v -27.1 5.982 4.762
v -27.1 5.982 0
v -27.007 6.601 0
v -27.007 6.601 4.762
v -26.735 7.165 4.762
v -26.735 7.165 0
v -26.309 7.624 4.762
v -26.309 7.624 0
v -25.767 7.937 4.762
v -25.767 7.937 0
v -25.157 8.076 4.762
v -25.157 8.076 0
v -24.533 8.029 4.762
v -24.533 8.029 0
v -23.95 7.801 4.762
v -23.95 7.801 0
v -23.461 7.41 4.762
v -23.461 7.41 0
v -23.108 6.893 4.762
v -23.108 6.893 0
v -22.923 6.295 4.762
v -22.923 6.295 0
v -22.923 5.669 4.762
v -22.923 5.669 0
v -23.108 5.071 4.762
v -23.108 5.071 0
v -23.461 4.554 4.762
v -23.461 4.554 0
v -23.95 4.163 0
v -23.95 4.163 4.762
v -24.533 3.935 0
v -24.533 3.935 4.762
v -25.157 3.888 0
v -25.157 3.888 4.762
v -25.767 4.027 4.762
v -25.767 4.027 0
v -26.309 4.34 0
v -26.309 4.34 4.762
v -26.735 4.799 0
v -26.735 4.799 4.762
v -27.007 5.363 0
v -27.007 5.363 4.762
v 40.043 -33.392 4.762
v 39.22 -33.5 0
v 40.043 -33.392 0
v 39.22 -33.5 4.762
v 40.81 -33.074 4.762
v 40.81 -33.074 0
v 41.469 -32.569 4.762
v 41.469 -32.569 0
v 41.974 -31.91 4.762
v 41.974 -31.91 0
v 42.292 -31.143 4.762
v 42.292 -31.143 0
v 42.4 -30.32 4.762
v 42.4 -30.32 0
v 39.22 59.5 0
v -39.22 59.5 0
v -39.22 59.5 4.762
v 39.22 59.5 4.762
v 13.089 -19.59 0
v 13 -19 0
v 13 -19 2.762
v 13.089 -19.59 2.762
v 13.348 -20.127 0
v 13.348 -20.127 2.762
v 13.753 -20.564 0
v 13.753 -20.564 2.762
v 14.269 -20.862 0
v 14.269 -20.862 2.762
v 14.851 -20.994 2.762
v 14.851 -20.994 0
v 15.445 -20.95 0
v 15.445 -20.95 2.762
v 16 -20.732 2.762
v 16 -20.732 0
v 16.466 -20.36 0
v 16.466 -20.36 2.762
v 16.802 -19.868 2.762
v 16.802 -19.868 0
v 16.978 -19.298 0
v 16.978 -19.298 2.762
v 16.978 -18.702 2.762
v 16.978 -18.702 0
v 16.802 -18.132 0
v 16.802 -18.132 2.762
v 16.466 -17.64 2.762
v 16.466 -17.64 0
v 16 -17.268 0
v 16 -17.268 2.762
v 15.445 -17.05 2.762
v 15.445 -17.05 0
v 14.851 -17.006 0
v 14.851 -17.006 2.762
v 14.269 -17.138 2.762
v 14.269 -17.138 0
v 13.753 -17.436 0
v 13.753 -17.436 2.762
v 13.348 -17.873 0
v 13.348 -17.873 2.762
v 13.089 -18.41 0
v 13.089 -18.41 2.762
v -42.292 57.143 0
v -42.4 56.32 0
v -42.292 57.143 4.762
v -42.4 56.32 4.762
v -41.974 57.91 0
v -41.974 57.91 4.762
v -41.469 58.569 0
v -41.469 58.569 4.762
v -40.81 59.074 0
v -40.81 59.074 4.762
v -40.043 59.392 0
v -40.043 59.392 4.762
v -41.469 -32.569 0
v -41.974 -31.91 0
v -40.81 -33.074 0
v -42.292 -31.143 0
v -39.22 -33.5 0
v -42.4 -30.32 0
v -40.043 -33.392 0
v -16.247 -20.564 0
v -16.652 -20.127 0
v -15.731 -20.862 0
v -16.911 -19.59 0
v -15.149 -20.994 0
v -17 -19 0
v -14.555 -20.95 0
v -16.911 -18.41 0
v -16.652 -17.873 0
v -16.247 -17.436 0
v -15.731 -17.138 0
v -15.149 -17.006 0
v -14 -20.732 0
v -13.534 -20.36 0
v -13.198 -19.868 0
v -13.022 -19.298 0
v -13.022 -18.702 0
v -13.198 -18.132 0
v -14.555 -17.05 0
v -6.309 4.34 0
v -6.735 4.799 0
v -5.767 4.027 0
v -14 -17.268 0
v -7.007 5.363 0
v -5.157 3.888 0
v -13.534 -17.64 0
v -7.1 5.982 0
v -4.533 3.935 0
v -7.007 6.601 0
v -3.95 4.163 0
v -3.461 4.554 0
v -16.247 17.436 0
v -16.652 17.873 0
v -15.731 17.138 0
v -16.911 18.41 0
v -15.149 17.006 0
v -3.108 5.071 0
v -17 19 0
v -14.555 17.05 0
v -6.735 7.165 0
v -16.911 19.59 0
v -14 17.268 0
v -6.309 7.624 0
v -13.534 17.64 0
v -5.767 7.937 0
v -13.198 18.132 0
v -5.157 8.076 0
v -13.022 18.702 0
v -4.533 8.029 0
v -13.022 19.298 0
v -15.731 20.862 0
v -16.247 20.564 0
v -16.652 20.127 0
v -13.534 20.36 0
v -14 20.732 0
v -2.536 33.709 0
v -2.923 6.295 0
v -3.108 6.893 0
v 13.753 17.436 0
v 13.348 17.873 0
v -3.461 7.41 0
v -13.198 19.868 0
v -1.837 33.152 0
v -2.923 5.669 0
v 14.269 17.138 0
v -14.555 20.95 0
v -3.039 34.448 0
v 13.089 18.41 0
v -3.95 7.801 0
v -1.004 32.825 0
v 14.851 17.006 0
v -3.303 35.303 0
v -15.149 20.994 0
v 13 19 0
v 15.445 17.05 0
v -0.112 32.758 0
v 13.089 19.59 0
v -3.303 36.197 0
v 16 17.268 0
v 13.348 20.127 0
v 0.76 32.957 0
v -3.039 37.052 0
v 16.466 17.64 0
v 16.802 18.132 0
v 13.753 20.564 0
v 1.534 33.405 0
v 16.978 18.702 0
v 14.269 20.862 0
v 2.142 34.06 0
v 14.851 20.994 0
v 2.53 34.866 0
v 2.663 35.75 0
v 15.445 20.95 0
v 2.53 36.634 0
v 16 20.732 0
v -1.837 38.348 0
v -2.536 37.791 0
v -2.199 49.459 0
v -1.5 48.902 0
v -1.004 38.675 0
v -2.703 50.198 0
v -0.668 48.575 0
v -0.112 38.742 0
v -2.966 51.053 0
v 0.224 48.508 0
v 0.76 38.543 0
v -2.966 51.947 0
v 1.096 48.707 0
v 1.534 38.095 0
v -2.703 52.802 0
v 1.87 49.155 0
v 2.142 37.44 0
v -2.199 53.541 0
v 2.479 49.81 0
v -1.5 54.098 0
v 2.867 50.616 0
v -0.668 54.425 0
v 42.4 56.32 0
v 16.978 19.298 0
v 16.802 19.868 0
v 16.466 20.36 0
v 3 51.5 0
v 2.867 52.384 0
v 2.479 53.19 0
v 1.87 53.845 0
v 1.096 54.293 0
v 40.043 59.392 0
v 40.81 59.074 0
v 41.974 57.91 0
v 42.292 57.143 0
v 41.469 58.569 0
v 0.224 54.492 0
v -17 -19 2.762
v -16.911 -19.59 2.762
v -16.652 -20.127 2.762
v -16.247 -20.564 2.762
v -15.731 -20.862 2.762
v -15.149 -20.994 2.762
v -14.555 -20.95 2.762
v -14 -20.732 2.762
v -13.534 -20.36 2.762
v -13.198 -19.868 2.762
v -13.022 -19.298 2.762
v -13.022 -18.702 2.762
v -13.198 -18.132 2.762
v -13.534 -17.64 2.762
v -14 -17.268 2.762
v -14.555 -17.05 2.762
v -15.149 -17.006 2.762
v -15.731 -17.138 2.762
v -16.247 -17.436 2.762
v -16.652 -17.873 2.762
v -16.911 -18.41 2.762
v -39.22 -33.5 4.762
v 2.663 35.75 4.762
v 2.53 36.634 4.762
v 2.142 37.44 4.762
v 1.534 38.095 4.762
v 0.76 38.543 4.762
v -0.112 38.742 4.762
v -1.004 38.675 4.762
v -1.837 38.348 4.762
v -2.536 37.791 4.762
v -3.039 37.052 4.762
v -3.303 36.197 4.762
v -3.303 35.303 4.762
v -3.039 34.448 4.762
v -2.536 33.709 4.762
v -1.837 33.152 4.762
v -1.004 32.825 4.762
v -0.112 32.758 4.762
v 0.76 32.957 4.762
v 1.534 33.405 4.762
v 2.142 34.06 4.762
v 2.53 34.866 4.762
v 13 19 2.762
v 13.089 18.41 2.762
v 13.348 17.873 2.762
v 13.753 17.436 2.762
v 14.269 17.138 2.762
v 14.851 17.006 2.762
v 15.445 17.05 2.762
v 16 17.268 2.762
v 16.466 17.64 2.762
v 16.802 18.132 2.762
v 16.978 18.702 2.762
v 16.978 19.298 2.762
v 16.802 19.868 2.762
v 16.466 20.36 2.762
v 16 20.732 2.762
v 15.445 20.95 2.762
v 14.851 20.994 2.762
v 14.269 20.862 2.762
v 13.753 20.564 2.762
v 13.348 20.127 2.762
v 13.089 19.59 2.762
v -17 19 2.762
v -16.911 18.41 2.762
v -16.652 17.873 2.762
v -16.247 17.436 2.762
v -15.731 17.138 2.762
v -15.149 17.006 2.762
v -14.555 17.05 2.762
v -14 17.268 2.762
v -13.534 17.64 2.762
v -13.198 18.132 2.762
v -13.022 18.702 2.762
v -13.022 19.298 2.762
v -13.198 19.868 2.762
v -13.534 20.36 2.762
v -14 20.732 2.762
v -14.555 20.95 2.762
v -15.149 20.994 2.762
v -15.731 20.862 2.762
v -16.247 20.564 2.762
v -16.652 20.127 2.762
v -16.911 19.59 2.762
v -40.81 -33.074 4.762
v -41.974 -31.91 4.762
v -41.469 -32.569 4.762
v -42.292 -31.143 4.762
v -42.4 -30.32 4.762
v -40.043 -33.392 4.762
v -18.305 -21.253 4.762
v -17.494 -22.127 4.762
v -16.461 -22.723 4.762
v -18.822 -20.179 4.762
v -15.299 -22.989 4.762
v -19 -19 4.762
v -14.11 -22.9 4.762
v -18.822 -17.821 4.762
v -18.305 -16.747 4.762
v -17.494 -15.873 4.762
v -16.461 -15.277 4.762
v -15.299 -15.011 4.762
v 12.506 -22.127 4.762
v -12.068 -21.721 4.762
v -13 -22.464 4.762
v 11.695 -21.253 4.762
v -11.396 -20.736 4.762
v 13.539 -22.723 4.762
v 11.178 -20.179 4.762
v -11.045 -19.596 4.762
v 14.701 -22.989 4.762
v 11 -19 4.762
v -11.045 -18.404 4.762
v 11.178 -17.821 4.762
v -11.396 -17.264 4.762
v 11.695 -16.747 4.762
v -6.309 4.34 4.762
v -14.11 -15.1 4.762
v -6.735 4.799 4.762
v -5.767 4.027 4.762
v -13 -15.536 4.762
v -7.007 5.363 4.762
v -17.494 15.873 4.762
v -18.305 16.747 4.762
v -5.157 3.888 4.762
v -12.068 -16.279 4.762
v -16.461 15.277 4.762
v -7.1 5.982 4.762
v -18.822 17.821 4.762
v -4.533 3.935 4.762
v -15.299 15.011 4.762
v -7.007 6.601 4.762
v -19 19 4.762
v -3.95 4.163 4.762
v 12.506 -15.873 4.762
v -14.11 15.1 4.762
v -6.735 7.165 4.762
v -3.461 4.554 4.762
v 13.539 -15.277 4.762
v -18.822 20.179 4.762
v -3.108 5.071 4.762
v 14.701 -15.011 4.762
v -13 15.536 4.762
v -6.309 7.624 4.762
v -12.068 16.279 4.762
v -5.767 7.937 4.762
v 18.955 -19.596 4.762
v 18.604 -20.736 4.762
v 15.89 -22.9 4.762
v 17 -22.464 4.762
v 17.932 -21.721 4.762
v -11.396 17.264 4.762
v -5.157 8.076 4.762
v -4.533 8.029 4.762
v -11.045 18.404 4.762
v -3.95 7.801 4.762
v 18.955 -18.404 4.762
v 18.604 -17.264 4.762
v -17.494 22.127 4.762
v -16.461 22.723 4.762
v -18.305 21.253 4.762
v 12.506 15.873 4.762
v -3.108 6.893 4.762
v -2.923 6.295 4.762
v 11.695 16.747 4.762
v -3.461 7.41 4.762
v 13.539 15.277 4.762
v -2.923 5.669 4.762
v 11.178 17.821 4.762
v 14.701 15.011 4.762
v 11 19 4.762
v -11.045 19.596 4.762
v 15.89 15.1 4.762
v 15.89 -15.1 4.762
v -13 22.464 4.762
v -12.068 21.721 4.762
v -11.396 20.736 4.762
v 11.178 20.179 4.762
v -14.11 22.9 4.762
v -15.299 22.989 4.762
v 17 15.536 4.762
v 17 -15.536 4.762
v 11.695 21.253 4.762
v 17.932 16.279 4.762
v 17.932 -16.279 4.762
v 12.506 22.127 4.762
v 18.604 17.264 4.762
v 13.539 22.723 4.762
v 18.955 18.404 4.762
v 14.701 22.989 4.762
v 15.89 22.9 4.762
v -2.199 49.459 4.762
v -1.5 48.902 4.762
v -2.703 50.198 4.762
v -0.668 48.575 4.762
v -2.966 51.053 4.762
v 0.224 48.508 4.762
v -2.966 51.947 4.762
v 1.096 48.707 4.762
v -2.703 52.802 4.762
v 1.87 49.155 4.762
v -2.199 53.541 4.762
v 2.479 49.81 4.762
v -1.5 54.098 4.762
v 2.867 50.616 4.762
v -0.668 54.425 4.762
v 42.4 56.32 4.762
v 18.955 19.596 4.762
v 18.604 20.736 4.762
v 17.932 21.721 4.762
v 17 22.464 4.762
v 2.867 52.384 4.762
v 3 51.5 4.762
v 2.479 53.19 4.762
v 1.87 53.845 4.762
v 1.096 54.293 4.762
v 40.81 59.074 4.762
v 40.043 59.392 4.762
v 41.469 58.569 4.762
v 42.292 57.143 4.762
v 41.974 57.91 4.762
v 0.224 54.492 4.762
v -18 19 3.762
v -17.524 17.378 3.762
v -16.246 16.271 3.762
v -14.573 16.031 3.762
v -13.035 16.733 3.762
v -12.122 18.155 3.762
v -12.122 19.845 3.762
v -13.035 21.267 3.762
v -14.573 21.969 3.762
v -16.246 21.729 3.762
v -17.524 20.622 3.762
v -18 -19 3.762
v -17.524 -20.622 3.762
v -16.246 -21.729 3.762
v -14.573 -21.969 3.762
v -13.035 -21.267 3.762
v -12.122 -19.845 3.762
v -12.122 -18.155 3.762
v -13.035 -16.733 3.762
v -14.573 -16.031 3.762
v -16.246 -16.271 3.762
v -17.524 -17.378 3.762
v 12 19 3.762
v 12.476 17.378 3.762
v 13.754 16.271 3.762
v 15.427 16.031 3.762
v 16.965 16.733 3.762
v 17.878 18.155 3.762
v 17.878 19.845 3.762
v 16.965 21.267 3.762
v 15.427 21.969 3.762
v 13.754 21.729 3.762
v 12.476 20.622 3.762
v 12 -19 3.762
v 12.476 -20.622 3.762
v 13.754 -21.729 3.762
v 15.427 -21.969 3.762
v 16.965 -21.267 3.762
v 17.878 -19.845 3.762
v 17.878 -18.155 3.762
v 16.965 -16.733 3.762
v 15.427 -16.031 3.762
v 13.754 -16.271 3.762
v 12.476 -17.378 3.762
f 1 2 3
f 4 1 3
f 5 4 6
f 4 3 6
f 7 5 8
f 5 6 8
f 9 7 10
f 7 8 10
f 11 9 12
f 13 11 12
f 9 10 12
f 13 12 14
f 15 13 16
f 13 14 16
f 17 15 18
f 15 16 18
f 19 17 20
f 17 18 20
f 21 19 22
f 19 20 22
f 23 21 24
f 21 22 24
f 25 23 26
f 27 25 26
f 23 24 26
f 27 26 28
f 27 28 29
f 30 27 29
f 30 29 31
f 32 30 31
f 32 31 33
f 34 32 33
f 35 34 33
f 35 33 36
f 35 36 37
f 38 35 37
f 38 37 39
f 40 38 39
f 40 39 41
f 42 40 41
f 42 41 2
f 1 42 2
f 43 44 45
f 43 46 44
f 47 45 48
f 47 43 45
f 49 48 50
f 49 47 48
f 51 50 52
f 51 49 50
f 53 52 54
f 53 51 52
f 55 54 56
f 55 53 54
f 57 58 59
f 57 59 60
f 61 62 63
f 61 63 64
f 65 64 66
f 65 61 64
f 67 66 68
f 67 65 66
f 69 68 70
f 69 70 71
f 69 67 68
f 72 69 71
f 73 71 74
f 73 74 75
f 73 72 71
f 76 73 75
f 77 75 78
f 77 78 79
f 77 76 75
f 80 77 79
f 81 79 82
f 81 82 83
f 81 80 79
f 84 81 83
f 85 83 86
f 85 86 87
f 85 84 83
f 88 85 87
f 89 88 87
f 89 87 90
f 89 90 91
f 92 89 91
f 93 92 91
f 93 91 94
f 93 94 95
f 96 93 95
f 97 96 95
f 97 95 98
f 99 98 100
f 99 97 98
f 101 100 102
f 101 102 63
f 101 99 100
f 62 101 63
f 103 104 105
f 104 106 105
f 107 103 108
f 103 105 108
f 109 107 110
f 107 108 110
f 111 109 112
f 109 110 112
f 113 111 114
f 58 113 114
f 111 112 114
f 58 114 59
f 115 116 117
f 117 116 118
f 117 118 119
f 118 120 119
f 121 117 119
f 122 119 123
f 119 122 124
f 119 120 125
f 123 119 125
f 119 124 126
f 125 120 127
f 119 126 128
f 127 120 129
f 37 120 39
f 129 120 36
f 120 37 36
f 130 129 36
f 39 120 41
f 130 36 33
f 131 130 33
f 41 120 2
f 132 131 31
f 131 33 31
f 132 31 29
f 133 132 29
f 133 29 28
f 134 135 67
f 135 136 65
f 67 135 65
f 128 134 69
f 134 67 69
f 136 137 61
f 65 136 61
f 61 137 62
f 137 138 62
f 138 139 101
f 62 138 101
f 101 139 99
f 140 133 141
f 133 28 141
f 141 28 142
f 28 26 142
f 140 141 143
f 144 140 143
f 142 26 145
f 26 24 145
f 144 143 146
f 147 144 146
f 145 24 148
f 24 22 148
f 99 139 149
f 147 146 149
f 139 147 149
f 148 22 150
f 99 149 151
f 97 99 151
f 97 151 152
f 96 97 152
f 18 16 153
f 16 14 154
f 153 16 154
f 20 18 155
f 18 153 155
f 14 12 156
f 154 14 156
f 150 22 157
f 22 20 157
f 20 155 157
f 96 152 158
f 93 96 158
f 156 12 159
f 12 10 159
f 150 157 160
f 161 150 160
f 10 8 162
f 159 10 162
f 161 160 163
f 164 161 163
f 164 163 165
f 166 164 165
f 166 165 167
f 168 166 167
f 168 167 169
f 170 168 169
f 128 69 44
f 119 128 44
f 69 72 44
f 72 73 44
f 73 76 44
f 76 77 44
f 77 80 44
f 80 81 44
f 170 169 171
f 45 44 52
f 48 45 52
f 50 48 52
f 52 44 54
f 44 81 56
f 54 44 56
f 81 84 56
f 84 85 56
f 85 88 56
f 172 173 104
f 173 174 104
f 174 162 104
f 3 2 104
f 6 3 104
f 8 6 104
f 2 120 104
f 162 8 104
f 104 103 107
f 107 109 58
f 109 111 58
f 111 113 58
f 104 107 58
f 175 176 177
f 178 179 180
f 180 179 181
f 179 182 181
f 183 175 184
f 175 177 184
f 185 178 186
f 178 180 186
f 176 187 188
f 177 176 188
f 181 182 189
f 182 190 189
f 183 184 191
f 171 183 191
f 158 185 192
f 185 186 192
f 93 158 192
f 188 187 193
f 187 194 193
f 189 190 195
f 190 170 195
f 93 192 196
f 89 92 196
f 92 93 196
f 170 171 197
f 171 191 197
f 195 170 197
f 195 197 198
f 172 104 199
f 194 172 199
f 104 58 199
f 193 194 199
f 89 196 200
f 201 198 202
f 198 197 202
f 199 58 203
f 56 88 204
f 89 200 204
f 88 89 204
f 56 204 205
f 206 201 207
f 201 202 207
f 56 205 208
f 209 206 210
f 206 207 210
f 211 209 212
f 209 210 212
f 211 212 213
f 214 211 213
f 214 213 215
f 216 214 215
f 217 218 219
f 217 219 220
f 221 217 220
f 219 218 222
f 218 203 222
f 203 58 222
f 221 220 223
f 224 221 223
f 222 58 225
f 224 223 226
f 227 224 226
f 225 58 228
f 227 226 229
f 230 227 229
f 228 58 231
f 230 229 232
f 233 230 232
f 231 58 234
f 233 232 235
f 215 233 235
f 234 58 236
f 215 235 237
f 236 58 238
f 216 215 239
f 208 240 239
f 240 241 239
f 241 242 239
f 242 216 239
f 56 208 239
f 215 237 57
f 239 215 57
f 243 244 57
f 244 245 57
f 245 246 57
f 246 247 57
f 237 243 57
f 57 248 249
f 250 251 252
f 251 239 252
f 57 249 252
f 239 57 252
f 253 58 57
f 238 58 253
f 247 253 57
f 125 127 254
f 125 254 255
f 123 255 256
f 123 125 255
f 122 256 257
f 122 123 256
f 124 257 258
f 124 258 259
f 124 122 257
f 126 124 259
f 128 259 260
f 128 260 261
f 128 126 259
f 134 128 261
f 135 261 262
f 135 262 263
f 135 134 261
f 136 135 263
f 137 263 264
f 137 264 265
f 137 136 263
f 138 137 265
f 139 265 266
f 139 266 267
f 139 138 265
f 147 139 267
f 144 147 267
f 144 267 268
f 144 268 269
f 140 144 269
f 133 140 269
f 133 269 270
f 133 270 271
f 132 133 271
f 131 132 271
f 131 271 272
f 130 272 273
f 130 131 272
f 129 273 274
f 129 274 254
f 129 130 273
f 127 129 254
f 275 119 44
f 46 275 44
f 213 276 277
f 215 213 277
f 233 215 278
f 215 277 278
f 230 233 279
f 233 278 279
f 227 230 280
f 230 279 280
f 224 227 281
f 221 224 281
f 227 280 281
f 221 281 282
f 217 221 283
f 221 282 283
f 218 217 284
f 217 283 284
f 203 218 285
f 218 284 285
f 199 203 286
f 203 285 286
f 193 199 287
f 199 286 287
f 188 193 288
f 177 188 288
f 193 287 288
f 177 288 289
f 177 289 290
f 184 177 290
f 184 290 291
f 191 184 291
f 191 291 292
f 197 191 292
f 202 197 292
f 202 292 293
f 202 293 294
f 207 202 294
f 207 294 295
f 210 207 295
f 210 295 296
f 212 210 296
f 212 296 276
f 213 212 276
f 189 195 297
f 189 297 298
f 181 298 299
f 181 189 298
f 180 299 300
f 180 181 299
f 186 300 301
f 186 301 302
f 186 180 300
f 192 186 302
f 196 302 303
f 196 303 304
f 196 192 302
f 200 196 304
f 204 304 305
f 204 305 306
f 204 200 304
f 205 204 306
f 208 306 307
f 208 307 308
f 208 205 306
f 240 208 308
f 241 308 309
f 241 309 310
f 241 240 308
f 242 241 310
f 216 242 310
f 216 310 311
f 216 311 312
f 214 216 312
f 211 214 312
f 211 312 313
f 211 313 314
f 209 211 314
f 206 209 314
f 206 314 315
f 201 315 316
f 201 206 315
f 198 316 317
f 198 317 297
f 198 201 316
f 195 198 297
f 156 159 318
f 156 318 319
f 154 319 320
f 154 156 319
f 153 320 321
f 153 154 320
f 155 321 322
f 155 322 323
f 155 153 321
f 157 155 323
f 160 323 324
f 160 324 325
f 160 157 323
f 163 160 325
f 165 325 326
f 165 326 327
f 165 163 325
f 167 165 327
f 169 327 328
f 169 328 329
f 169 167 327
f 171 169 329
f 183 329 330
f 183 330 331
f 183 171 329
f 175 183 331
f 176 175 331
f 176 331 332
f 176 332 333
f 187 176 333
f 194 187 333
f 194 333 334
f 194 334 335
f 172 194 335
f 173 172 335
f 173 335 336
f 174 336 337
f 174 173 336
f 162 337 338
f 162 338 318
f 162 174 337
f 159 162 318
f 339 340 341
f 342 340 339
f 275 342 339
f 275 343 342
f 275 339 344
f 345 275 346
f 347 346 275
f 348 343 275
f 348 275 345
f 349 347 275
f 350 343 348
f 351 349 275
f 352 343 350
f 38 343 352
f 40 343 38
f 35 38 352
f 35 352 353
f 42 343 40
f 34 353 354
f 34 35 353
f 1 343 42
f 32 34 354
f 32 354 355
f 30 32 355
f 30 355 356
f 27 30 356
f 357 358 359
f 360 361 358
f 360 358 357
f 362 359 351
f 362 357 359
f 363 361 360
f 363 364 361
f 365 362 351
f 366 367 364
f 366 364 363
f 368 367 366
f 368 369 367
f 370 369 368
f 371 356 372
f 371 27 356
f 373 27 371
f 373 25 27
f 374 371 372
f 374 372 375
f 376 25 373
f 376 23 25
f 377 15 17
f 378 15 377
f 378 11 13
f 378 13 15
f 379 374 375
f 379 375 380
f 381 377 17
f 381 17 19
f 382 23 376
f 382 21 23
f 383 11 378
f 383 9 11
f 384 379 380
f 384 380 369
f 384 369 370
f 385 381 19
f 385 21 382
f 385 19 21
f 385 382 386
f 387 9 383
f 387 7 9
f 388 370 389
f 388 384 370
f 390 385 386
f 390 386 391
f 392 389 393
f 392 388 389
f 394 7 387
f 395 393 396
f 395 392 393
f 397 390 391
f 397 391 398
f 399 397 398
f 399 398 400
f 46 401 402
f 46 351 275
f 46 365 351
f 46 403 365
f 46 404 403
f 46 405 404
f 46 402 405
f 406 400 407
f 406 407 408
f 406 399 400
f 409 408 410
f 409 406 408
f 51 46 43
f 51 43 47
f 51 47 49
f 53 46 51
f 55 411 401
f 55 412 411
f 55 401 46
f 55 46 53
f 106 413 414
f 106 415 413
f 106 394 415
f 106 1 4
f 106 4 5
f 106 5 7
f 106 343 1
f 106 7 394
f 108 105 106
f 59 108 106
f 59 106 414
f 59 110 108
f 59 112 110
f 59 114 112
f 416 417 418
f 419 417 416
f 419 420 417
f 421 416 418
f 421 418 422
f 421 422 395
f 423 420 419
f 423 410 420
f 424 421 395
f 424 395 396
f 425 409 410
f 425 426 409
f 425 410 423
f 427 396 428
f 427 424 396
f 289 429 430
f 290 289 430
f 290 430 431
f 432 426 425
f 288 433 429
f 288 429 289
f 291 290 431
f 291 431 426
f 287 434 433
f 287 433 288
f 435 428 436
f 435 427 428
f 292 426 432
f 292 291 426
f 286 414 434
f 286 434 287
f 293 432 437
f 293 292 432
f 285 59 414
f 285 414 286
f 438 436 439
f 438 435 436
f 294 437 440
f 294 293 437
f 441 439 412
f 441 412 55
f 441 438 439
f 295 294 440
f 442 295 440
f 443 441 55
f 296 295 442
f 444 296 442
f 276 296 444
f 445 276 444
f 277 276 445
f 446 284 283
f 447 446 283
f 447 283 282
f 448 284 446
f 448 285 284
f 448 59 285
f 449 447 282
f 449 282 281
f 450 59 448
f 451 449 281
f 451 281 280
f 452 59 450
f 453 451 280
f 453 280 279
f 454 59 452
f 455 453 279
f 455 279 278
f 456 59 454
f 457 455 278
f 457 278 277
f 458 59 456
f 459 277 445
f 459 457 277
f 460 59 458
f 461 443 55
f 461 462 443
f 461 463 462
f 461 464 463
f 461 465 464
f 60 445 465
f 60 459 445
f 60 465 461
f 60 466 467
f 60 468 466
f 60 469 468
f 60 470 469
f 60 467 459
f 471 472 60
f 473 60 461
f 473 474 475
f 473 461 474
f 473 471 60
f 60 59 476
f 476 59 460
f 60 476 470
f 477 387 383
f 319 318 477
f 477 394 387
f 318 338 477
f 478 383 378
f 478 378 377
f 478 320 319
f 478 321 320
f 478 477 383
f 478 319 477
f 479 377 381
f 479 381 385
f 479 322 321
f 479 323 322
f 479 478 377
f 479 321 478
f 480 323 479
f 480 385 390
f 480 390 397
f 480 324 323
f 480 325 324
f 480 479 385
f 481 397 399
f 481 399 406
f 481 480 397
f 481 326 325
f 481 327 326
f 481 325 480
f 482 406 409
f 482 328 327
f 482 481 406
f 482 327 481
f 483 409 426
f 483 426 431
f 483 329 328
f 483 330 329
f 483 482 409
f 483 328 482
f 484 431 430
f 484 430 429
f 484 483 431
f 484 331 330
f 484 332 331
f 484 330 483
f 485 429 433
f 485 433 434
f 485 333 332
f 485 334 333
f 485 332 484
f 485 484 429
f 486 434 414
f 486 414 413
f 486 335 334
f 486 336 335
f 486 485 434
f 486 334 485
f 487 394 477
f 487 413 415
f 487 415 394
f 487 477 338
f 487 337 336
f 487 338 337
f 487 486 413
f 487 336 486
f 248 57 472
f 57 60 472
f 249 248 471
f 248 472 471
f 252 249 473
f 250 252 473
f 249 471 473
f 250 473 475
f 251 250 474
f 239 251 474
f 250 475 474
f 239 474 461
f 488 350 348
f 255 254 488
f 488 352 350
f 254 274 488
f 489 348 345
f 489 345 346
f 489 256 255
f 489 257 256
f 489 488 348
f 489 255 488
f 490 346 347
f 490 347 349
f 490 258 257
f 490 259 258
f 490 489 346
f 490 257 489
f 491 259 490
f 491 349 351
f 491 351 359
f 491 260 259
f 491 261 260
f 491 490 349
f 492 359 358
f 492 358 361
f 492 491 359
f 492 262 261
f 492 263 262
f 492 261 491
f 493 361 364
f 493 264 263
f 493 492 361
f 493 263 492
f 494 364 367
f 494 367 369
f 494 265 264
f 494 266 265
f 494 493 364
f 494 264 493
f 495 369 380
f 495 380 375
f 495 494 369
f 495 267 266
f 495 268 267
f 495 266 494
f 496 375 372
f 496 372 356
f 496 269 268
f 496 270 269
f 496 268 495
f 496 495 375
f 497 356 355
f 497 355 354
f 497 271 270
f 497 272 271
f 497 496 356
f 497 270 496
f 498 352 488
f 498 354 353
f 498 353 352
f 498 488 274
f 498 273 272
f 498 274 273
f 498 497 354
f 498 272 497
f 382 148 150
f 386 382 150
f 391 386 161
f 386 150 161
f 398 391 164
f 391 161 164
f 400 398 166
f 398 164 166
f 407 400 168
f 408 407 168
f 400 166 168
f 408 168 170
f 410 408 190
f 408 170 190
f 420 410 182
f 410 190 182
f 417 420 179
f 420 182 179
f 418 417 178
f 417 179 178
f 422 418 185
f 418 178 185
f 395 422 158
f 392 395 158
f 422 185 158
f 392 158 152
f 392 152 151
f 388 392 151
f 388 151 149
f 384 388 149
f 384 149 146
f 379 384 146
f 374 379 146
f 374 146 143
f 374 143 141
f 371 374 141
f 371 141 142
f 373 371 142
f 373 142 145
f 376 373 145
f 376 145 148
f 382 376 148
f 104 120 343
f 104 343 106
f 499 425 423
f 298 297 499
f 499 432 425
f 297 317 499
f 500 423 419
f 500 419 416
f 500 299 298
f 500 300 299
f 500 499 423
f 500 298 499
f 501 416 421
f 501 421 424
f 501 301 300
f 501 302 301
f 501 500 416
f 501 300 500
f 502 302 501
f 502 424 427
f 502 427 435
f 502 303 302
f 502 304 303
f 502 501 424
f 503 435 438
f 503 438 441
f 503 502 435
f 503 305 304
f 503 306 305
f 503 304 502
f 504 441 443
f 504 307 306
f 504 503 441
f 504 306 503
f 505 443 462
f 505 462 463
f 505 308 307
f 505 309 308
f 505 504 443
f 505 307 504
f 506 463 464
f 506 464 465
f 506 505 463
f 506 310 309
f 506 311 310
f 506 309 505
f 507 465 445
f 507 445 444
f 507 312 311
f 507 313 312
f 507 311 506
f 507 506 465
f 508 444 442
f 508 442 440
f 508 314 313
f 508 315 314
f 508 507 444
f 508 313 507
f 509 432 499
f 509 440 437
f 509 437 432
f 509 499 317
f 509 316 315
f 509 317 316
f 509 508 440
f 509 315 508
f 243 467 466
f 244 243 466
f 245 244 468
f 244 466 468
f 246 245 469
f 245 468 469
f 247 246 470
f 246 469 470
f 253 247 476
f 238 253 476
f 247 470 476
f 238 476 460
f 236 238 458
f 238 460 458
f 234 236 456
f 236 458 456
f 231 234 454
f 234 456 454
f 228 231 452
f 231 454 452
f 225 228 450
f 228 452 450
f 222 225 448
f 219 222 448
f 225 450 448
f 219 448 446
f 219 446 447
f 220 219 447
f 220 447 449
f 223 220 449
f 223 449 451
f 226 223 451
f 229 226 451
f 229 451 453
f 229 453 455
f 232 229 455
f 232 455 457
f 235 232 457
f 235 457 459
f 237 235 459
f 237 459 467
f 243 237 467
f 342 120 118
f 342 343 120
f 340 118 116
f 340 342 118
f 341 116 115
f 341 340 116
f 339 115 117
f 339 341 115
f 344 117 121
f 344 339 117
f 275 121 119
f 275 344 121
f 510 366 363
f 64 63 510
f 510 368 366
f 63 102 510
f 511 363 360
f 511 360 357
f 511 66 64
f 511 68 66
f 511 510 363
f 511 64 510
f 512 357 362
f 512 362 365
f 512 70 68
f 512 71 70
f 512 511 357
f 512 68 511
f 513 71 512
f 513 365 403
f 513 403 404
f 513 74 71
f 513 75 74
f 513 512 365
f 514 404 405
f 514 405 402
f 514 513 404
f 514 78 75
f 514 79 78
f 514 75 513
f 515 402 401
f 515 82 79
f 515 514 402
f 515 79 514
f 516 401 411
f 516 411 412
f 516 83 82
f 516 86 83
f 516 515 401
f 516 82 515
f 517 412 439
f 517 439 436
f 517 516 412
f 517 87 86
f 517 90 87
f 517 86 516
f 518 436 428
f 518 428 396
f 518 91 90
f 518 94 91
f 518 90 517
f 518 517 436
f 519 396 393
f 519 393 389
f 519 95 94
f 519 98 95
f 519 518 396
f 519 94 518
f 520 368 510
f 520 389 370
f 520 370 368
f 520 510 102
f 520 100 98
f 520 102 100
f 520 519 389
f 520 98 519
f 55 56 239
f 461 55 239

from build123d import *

# Parameters (mm, degrees)
SKETCH1_W                    = 84.8
SKETCH1_H                    = 93
SKETCH1_R                    = 2
BOSS_EXTRUDE1_DEPTH          = 4.7625
FILLET1_R                    = 3.18
F_6_0_6_DIAMETER_HOLE1_D     = 6
F_6_0_6_DIAMETER_HOLE1_DEPTH = 24
F_6_0_6_DIAMETER_HOLE1_TIP   = 1.802581857
CHAMFER1_SIZE                = 2
M5X0_8_TAPPED_HOLE1_D        = 4.2
M5X0_8_TAPPED_HOLE1_DEPTH    = 14
M5X0_8_TAPPED_HOLE1_TIP      = 1.2618073


with BuildPart() as part:
    # Sketch1 → Boss-Extrude1 (new body)
    with BuildSketch(Plane.XY):
        with Locations((0, 13)):
            Rectangle(SKETCH1_W, SKETCH1_H)
        with Locations(Location((15, -19, 0), (0, 0, 180))):
            Circle(SKETCH1_R, mode=Mode.SUBTRACT)
        with Locations(Location((-15, -19, 0), (0, 0, 180))):
            Circle(SKETCH1_R, mode=Mode.SUBTRACT)
        with Locations(Location((15, 19, 0), (0, 0, 180))):
            Circle(SKETCH1_R, mode=Mode.SUBTRACT)
        with Locations(Location((-15, 19, 0), (0, 0, 180))):
            Circle(SKETCH1_R, mode=Mode.SUBTRACT)
    extrude(amount=BOSS_EXTRUDE1_DEPTH)

    # Fillet1
    fillet1_edges = [part.edges().sort_by_distance(p)[0] for p in [
        (-42.4, -33.5, 2.38125),
        (-42.4, 59.5, 2.38125),
        (42.4, 59.5, 2.38125),
        (42.4, -33.5, 2.38125),
    ]]
    fillet(fillet1_edges, radius=FILLET1_R)

    # Ø6.0 (6) Diameter Hole1
    with Locations(Plane(origin=(0, 0, 0), x_dir=(-1, 0, 0), z_dir=(0, 0, -1))):
        with Locations((0, 51.5), (0.336501066, 35.75)):
            Hole(F_6_0_6_DIAMETER_HOLE1_D / 2, depth=F_6_0_6_DIAMETER_HOLE1_DEPTH)
            with Locations((0, 0, -(F_6_0_6_DIAMETER_HOLE1_DEPTH + F_6_0_6_DIAMETER_HOLE1_TIP / 2))):  # 118° drill point
                Cone(0, F_6_0_6_DIAMETER_HOLE1_D / 2, F_6_0_6_DIAMETER_HOLE1_TIP, mode=Mode.SUBTRACT)

    # Chamfer1
    chamfer1_edges = [part.edges().sort_by_distance(p)[0] for p in [
        (-13, -19, 4.7625),
        (17, 19, 4.7625),
        (-13, 19, 4.7625),
        (17, -19, 4.7625),
    ]]
    chamfer(chamfer1_edges, length=CHAMFER1_SIZE)

    # M5x0.8 Tapped Hole1
    with Locations(Plane.XY.offset(4.7625)):
        with Locations((-70.208358725, 8.341624021), (-69.847000611, 8.341624021), (-25, 5.982129573), (-5, 5.982129573)):
            Hole(M5X0_8_TAPPED_HOLE1_D / 2, depth=M5X0_8_TAPPED_HOLE1_DEPTH)
            with Locations((0, 0, -(M5X0_8_TAPPED_HOLE1_DEPTH + M5X0_8_TAPPED_HOLE1_TIP / 2))):  # 118° drill point
                Cone(0, M5X0_8_TAPPED_HOLE1_D / 2, M5X0_8_TAPPED_HOLE1_TIP, mode=Mode.SUBTRACT)


solid = part.part
